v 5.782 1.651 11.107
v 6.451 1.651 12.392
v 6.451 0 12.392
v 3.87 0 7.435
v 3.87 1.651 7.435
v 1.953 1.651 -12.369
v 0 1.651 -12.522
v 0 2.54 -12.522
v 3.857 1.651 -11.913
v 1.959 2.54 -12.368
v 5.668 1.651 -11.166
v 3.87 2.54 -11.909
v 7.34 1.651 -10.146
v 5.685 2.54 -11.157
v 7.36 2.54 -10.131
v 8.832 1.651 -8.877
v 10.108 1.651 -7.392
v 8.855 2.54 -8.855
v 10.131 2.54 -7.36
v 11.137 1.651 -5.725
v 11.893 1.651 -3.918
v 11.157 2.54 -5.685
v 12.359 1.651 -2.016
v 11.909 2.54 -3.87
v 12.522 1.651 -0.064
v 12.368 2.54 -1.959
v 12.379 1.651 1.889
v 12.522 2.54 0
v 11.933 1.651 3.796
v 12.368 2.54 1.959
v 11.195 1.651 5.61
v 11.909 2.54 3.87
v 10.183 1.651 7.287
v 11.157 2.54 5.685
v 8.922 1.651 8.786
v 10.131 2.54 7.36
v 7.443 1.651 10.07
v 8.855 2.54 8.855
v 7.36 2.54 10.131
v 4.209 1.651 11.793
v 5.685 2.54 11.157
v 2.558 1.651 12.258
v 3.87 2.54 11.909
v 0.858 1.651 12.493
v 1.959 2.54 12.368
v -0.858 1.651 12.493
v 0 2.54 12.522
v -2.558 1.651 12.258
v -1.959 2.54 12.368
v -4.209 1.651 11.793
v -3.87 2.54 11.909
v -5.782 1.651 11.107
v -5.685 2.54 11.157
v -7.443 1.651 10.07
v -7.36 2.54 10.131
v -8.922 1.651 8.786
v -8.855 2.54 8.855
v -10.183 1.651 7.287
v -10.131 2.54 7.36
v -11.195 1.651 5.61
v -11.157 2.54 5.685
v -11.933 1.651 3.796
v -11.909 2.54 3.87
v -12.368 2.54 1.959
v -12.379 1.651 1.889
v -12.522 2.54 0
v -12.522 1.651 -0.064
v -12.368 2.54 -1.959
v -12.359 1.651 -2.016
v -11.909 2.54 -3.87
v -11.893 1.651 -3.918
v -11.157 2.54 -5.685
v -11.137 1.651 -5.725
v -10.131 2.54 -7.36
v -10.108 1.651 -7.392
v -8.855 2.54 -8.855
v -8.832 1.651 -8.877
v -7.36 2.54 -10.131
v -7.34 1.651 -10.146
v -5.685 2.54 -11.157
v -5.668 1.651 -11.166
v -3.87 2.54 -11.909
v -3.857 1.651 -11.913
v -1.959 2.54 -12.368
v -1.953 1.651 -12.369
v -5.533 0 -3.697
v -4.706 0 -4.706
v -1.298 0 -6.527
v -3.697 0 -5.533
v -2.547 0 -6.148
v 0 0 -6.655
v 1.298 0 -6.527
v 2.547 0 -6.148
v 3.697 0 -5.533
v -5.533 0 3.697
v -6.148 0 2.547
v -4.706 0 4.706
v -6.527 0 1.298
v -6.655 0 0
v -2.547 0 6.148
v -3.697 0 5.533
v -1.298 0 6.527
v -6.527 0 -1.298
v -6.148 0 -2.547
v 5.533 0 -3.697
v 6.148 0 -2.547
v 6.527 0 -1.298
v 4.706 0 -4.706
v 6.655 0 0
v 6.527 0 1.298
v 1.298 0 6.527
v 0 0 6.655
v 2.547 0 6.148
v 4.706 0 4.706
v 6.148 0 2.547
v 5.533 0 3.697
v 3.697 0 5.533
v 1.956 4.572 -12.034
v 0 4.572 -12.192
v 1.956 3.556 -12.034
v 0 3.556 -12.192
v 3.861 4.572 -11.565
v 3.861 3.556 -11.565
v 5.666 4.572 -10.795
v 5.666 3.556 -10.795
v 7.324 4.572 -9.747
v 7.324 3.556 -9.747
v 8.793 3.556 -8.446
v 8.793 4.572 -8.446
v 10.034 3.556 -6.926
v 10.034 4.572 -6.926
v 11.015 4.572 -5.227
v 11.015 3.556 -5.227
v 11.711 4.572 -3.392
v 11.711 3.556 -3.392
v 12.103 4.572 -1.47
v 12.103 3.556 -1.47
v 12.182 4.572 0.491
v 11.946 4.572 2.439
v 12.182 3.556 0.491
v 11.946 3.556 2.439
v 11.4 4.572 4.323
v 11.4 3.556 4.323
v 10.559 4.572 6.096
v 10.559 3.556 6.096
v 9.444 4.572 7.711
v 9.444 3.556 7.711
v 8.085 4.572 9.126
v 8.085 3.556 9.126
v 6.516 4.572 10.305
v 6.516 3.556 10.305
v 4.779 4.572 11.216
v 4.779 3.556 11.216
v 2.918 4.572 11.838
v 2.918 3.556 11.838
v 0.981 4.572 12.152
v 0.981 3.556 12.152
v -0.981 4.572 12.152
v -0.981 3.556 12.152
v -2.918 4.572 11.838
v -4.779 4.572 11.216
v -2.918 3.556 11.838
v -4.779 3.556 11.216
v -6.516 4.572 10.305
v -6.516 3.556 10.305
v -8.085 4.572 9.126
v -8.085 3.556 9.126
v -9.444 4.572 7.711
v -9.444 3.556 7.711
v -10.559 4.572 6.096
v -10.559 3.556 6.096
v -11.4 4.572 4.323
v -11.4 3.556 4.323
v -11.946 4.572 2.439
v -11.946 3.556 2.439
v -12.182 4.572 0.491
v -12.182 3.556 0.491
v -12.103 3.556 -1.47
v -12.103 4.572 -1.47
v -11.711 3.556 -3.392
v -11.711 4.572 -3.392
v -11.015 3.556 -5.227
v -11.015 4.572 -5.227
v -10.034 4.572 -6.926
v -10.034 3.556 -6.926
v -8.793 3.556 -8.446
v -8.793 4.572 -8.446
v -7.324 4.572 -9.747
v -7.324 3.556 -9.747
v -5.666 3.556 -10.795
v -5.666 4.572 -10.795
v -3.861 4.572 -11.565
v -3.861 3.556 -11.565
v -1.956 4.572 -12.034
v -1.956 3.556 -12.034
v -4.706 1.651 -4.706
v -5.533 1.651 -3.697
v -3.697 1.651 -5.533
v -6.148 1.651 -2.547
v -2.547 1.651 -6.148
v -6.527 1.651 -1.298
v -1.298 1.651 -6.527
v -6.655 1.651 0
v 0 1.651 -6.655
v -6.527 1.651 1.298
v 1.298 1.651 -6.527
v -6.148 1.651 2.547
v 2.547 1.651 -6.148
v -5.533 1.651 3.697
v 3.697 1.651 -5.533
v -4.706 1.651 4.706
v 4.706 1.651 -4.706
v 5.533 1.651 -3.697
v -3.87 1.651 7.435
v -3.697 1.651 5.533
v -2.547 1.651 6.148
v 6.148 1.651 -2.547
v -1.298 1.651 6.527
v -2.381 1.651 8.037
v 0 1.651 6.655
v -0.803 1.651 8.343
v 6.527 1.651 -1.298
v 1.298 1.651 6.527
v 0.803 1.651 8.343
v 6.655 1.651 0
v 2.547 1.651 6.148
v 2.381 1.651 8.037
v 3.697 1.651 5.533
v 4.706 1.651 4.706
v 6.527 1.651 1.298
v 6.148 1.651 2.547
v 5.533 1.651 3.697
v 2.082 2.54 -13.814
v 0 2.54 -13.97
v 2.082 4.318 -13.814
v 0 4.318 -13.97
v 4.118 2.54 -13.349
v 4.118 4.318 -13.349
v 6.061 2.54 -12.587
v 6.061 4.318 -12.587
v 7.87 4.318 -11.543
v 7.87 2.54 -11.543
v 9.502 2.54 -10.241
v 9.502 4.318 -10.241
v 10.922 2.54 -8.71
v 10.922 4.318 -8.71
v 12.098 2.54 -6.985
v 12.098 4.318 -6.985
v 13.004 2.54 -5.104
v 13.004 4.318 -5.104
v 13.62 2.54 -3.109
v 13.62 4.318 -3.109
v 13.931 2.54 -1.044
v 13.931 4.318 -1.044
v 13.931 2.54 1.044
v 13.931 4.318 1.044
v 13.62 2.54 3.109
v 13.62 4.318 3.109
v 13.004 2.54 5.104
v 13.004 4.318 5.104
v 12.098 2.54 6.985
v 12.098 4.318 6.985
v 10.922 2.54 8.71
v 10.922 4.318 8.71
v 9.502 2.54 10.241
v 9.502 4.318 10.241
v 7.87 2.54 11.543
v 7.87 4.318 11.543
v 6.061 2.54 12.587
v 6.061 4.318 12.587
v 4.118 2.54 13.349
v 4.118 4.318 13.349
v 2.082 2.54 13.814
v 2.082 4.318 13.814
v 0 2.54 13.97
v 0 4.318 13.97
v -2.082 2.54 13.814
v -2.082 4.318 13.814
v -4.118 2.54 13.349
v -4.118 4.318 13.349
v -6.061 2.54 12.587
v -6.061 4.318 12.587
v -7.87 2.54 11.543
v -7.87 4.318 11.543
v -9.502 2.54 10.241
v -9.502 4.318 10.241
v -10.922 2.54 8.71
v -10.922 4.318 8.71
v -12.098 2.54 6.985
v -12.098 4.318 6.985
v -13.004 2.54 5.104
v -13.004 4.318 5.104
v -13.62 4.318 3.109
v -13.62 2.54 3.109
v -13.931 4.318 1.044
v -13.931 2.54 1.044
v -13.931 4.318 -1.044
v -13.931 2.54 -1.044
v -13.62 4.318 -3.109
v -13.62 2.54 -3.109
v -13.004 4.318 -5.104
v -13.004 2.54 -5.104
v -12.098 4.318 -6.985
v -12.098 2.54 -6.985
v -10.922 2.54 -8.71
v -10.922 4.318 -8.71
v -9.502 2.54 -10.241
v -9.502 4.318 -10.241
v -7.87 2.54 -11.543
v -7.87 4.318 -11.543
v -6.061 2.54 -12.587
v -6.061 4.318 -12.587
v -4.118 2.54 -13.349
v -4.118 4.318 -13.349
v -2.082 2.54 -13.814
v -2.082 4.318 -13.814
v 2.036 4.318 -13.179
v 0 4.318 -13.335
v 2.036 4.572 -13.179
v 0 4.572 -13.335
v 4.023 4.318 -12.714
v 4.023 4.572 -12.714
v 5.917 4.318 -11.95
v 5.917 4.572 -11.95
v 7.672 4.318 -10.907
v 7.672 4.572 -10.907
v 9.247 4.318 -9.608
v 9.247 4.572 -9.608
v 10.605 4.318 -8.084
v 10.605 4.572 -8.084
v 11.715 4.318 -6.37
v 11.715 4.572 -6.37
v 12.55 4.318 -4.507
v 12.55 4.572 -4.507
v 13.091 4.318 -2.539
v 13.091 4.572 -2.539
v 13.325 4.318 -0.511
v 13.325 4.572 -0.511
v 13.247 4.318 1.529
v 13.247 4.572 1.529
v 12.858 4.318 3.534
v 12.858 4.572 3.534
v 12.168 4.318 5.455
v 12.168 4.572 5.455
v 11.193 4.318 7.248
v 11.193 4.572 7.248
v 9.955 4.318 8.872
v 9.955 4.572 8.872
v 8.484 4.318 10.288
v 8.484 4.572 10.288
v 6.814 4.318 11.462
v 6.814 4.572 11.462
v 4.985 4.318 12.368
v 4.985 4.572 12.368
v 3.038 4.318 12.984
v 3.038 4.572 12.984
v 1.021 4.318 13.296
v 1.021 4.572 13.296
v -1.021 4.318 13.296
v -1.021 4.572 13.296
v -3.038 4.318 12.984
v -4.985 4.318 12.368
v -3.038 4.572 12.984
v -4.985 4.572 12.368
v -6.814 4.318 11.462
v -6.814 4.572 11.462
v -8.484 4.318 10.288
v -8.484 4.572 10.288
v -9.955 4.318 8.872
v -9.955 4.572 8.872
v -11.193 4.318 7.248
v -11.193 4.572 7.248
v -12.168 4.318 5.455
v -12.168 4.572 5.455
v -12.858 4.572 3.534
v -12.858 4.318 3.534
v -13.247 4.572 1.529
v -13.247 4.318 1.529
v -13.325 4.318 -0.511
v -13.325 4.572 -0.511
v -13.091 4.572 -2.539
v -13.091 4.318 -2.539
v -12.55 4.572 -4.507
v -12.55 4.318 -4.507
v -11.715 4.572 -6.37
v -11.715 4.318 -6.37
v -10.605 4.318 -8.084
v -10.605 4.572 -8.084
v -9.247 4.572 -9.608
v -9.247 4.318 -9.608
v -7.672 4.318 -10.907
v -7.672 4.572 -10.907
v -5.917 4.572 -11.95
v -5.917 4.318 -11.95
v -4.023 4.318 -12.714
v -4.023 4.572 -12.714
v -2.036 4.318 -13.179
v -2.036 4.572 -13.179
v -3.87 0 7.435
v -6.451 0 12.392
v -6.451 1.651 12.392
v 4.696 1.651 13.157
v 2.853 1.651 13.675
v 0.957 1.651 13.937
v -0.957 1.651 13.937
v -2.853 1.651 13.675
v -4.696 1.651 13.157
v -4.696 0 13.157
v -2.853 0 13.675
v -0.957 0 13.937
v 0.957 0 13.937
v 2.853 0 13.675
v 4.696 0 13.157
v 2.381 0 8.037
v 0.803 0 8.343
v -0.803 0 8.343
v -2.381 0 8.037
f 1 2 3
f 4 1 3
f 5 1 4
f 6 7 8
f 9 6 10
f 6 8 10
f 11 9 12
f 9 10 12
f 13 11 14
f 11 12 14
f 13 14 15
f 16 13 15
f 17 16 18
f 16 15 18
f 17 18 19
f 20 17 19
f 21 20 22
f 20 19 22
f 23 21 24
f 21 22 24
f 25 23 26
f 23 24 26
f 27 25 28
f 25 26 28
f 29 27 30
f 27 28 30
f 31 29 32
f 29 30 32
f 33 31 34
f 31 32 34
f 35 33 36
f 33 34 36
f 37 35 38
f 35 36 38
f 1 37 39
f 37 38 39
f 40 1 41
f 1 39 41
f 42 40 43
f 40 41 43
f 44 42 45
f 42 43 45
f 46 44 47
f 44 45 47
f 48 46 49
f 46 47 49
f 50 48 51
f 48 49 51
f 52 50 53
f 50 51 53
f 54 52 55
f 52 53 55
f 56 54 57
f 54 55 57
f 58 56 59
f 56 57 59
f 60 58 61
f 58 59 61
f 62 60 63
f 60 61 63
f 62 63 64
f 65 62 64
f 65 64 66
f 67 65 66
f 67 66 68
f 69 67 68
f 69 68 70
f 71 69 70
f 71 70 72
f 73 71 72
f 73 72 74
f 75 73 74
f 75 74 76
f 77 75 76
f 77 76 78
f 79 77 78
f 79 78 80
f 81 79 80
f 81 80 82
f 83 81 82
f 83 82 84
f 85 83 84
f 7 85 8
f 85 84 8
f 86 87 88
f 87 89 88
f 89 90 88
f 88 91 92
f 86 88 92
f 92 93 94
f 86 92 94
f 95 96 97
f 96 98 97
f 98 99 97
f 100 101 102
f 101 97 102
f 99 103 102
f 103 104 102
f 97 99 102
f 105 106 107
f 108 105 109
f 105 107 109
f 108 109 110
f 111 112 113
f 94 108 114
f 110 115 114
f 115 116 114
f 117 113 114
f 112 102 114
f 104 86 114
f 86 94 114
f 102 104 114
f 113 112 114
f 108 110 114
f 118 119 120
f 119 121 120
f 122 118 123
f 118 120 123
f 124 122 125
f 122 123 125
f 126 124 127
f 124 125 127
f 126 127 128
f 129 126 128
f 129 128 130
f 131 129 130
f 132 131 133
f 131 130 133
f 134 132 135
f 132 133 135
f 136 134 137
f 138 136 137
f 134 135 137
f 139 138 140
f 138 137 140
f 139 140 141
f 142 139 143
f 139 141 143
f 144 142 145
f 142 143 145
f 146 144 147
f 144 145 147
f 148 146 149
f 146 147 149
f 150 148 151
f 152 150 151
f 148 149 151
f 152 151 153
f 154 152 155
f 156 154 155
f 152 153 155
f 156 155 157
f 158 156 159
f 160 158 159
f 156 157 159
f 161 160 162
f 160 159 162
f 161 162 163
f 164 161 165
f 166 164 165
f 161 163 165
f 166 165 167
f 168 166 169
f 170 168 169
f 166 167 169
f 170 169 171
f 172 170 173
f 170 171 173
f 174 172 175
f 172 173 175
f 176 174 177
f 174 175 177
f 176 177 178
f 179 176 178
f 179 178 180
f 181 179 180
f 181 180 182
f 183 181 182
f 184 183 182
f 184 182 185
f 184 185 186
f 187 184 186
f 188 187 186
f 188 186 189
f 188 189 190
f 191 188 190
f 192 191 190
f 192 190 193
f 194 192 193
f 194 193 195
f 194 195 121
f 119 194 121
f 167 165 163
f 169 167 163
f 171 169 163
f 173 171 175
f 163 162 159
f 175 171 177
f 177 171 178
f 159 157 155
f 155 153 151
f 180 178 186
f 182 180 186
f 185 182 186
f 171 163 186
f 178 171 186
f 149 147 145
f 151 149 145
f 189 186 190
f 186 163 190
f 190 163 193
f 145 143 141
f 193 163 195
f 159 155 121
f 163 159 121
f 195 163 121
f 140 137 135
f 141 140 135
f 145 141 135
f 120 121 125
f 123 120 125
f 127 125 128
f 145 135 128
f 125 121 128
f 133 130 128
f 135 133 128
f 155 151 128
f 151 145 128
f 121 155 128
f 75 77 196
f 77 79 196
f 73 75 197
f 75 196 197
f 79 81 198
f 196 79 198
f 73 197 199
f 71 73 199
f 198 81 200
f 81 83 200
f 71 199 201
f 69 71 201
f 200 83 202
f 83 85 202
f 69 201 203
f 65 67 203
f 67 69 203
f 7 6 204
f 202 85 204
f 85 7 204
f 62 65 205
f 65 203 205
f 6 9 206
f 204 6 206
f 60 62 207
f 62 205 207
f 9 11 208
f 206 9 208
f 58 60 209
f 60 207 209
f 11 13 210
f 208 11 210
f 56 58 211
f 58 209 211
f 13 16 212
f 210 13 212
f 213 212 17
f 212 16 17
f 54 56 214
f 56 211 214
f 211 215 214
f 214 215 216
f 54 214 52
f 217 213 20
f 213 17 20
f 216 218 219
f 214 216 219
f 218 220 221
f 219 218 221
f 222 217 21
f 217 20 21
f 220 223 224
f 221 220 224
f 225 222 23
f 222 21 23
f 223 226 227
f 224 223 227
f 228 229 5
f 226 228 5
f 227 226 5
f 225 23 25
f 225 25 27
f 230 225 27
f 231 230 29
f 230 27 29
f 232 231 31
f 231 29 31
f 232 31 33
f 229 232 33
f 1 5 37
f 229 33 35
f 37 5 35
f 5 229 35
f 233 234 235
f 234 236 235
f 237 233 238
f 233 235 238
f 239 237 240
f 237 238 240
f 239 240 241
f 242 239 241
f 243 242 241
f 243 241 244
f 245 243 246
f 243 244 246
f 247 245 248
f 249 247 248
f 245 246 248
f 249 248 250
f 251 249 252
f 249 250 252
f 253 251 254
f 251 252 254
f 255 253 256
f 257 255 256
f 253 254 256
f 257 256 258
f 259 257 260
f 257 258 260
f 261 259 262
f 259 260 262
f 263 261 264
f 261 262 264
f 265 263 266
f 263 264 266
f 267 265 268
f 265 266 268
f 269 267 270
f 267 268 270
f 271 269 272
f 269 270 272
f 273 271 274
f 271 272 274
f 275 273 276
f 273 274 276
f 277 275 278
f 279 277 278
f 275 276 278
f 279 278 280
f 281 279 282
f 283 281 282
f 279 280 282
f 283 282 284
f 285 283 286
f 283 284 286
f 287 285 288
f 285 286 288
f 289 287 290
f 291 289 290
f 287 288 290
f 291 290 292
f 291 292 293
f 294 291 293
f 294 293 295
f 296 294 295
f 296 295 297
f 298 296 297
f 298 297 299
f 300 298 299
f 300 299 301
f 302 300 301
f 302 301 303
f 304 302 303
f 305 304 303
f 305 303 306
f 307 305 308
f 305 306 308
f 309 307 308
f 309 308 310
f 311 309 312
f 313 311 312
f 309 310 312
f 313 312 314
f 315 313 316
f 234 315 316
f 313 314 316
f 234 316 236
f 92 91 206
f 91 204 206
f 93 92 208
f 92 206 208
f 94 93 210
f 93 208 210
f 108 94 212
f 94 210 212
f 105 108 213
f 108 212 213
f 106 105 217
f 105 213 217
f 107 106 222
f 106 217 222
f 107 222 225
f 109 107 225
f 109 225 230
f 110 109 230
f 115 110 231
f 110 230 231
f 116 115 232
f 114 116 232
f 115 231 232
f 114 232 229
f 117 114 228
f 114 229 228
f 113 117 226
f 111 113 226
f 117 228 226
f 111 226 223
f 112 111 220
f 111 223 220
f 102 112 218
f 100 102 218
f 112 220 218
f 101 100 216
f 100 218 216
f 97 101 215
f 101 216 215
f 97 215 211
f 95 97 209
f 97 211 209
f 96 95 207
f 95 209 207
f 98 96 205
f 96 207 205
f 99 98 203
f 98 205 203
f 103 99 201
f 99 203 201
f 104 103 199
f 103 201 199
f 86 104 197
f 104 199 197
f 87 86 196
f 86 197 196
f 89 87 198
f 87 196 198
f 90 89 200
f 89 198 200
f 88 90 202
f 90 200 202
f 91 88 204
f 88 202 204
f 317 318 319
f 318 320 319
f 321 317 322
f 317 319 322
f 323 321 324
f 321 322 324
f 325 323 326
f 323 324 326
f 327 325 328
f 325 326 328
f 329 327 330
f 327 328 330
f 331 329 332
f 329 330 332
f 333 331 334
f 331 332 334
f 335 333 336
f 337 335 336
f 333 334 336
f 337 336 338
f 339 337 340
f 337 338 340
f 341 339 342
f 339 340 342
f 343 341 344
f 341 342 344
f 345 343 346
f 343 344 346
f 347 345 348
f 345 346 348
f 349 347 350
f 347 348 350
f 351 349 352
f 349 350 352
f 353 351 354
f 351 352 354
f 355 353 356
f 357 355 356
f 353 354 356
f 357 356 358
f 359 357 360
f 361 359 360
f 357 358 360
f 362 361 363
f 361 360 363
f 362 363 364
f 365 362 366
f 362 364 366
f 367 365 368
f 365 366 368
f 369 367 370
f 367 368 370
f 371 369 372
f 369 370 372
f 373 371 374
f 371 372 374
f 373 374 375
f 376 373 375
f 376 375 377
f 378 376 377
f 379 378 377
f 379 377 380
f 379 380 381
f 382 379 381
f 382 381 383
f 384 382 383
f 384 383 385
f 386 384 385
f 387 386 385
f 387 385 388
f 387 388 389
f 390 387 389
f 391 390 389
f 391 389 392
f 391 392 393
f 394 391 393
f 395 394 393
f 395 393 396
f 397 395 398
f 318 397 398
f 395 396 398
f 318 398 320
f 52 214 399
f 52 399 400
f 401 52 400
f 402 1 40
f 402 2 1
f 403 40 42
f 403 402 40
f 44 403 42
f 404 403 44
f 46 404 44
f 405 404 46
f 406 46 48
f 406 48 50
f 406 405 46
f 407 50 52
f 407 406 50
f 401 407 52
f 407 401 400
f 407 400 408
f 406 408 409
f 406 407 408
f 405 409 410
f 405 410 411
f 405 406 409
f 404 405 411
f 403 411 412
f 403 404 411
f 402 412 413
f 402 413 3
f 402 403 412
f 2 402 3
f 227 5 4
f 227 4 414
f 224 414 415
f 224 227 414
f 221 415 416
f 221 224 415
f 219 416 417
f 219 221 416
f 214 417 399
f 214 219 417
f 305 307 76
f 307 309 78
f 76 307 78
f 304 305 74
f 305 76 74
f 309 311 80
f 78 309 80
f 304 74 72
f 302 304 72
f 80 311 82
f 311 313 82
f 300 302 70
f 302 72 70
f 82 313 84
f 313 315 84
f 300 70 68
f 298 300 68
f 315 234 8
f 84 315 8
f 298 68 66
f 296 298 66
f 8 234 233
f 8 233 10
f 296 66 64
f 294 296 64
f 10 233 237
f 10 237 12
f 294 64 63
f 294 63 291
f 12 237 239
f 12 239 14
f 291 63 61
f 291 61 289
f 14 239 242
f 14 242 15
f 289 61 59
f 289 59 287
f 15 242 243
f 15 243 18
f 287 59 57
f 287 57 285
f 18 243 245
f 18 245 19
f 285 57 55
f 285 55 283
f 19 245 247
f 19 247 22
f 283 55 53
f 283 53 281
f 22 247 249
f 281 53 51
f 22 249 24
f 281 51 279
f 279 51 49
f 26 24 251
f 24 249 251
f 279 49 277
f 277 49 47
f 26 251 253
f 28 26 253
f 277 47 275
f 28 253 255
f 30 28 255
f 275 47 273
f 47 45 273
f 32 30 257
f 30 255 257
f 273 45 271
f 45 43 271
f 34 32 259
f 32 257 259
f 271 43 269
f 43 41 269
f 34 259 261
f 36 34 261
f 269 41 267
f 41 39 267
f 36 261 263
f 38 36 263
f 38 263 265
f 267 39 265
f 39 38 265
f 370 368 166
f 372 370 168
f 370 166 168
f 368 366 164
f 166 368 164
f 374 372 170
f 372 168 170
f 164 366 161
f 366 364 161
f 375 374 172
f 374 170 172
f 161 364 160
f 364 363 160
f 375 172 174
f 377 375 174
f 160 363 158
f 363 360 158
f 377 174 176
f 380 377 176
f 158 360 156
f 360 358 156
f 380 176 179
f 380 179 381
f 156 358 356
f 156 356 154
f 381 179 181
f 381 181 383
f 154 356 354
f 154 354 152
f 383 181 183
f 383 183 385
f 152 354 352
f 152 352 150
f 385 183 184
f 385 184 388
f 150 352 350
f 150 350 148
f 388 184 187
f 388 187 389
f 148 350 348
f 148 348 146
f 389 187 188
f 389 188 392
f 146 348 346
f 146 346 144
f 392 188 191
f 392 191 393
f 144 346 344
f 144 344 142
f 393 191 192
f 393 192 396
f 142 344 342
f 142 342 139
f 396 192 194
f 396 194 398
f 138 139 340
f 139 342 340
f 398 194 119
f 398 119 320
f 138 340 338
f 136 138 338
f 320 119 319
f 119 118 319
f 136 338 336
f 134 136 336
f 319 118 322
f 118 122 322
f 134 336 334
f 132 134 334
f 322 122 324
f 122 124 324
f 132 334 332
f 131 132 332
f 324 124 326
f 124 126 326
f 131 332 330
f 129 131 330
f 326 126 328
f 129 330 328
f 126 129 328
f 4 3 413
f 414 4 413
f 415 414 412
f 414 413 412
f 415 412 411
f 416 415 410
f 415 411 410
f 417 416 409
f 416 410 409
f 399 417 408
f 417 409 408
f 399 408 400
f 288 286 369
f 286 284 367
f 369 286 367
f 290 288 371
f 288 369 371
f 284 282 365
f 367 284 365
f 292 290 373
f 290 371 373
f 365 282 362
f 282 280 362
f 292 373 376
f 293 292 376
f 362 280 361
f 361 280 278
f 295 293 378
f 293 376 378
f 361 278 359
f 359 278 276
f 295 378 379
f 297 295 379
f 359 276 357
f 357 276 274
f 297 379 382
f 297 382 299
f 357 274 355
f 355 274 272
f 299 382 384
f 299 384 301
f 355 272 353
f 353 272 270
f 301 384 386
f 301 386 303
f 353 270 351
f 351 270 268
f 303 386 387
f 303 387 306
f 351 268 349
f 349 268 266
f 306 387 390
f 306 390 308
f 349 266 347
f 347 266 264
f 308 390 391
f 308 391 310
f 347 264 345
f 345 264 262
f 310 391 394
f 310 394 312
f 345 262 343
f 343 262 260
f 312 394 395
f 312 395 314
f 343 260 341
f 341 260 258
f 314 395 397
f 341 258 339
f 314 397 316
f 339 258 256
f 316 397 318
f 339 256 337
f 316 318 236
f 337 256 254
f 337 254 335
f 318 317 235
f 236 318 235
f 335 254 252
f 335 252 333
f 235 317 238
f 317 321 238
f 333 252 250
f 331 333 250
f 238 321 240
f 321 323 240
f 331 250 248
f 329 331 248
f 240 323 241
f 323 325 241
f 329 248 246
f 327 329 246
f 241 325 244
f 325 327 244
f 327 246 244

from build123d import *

# Parameters (mm, degrees)
BOSS_EXTRUDE1_DEPTH = 1.651


with BuildPart() as part:
    # Sketch1 → Revolve1 (revolve)
    with BuildSketch(Plane(origin=(0, 0, 0), x_dir=(0, 0, -1), z_dir=(1, 0, 0))):
        Polygon((0, 0), (6.6548, 0), (6.6548, 1.651), (12.5222, 1.651), (12.5222, 2.54), (13.97, 2.54), (13.97, 4.318), (13.335, 4.318), (13.335, 4.572), (12.192, 4.572), (12.192, 3.556), (0, 3.556), align=None)
    revolve(axis=Axis((0, 3.556, 0), (0, -1, 0)))

    # Sketch2 → Boss-Extrude1 (add)
    with BuildSketch(Plane.XZ.offset(-1.651)):
        with BuildLine():
            Line((-3.870376876, 7.434924804), (-6.450628127, 12.391541339))
            ThreePointArc((-6.450628127, 12.391541339), (0, 13.97), (6.450628127, 12.391541339))
            Line((6.450628127, 12.391541339), (3.870376876, 7.434924804))
            ThreePointArc((3.870376876, 7.434924804), (0, 8.382), (-3.870376876, 7.434924804))
        make_face()
    extrude(amount=BOSS_EXTRUDE1_DEPTH)


solid = part.part
